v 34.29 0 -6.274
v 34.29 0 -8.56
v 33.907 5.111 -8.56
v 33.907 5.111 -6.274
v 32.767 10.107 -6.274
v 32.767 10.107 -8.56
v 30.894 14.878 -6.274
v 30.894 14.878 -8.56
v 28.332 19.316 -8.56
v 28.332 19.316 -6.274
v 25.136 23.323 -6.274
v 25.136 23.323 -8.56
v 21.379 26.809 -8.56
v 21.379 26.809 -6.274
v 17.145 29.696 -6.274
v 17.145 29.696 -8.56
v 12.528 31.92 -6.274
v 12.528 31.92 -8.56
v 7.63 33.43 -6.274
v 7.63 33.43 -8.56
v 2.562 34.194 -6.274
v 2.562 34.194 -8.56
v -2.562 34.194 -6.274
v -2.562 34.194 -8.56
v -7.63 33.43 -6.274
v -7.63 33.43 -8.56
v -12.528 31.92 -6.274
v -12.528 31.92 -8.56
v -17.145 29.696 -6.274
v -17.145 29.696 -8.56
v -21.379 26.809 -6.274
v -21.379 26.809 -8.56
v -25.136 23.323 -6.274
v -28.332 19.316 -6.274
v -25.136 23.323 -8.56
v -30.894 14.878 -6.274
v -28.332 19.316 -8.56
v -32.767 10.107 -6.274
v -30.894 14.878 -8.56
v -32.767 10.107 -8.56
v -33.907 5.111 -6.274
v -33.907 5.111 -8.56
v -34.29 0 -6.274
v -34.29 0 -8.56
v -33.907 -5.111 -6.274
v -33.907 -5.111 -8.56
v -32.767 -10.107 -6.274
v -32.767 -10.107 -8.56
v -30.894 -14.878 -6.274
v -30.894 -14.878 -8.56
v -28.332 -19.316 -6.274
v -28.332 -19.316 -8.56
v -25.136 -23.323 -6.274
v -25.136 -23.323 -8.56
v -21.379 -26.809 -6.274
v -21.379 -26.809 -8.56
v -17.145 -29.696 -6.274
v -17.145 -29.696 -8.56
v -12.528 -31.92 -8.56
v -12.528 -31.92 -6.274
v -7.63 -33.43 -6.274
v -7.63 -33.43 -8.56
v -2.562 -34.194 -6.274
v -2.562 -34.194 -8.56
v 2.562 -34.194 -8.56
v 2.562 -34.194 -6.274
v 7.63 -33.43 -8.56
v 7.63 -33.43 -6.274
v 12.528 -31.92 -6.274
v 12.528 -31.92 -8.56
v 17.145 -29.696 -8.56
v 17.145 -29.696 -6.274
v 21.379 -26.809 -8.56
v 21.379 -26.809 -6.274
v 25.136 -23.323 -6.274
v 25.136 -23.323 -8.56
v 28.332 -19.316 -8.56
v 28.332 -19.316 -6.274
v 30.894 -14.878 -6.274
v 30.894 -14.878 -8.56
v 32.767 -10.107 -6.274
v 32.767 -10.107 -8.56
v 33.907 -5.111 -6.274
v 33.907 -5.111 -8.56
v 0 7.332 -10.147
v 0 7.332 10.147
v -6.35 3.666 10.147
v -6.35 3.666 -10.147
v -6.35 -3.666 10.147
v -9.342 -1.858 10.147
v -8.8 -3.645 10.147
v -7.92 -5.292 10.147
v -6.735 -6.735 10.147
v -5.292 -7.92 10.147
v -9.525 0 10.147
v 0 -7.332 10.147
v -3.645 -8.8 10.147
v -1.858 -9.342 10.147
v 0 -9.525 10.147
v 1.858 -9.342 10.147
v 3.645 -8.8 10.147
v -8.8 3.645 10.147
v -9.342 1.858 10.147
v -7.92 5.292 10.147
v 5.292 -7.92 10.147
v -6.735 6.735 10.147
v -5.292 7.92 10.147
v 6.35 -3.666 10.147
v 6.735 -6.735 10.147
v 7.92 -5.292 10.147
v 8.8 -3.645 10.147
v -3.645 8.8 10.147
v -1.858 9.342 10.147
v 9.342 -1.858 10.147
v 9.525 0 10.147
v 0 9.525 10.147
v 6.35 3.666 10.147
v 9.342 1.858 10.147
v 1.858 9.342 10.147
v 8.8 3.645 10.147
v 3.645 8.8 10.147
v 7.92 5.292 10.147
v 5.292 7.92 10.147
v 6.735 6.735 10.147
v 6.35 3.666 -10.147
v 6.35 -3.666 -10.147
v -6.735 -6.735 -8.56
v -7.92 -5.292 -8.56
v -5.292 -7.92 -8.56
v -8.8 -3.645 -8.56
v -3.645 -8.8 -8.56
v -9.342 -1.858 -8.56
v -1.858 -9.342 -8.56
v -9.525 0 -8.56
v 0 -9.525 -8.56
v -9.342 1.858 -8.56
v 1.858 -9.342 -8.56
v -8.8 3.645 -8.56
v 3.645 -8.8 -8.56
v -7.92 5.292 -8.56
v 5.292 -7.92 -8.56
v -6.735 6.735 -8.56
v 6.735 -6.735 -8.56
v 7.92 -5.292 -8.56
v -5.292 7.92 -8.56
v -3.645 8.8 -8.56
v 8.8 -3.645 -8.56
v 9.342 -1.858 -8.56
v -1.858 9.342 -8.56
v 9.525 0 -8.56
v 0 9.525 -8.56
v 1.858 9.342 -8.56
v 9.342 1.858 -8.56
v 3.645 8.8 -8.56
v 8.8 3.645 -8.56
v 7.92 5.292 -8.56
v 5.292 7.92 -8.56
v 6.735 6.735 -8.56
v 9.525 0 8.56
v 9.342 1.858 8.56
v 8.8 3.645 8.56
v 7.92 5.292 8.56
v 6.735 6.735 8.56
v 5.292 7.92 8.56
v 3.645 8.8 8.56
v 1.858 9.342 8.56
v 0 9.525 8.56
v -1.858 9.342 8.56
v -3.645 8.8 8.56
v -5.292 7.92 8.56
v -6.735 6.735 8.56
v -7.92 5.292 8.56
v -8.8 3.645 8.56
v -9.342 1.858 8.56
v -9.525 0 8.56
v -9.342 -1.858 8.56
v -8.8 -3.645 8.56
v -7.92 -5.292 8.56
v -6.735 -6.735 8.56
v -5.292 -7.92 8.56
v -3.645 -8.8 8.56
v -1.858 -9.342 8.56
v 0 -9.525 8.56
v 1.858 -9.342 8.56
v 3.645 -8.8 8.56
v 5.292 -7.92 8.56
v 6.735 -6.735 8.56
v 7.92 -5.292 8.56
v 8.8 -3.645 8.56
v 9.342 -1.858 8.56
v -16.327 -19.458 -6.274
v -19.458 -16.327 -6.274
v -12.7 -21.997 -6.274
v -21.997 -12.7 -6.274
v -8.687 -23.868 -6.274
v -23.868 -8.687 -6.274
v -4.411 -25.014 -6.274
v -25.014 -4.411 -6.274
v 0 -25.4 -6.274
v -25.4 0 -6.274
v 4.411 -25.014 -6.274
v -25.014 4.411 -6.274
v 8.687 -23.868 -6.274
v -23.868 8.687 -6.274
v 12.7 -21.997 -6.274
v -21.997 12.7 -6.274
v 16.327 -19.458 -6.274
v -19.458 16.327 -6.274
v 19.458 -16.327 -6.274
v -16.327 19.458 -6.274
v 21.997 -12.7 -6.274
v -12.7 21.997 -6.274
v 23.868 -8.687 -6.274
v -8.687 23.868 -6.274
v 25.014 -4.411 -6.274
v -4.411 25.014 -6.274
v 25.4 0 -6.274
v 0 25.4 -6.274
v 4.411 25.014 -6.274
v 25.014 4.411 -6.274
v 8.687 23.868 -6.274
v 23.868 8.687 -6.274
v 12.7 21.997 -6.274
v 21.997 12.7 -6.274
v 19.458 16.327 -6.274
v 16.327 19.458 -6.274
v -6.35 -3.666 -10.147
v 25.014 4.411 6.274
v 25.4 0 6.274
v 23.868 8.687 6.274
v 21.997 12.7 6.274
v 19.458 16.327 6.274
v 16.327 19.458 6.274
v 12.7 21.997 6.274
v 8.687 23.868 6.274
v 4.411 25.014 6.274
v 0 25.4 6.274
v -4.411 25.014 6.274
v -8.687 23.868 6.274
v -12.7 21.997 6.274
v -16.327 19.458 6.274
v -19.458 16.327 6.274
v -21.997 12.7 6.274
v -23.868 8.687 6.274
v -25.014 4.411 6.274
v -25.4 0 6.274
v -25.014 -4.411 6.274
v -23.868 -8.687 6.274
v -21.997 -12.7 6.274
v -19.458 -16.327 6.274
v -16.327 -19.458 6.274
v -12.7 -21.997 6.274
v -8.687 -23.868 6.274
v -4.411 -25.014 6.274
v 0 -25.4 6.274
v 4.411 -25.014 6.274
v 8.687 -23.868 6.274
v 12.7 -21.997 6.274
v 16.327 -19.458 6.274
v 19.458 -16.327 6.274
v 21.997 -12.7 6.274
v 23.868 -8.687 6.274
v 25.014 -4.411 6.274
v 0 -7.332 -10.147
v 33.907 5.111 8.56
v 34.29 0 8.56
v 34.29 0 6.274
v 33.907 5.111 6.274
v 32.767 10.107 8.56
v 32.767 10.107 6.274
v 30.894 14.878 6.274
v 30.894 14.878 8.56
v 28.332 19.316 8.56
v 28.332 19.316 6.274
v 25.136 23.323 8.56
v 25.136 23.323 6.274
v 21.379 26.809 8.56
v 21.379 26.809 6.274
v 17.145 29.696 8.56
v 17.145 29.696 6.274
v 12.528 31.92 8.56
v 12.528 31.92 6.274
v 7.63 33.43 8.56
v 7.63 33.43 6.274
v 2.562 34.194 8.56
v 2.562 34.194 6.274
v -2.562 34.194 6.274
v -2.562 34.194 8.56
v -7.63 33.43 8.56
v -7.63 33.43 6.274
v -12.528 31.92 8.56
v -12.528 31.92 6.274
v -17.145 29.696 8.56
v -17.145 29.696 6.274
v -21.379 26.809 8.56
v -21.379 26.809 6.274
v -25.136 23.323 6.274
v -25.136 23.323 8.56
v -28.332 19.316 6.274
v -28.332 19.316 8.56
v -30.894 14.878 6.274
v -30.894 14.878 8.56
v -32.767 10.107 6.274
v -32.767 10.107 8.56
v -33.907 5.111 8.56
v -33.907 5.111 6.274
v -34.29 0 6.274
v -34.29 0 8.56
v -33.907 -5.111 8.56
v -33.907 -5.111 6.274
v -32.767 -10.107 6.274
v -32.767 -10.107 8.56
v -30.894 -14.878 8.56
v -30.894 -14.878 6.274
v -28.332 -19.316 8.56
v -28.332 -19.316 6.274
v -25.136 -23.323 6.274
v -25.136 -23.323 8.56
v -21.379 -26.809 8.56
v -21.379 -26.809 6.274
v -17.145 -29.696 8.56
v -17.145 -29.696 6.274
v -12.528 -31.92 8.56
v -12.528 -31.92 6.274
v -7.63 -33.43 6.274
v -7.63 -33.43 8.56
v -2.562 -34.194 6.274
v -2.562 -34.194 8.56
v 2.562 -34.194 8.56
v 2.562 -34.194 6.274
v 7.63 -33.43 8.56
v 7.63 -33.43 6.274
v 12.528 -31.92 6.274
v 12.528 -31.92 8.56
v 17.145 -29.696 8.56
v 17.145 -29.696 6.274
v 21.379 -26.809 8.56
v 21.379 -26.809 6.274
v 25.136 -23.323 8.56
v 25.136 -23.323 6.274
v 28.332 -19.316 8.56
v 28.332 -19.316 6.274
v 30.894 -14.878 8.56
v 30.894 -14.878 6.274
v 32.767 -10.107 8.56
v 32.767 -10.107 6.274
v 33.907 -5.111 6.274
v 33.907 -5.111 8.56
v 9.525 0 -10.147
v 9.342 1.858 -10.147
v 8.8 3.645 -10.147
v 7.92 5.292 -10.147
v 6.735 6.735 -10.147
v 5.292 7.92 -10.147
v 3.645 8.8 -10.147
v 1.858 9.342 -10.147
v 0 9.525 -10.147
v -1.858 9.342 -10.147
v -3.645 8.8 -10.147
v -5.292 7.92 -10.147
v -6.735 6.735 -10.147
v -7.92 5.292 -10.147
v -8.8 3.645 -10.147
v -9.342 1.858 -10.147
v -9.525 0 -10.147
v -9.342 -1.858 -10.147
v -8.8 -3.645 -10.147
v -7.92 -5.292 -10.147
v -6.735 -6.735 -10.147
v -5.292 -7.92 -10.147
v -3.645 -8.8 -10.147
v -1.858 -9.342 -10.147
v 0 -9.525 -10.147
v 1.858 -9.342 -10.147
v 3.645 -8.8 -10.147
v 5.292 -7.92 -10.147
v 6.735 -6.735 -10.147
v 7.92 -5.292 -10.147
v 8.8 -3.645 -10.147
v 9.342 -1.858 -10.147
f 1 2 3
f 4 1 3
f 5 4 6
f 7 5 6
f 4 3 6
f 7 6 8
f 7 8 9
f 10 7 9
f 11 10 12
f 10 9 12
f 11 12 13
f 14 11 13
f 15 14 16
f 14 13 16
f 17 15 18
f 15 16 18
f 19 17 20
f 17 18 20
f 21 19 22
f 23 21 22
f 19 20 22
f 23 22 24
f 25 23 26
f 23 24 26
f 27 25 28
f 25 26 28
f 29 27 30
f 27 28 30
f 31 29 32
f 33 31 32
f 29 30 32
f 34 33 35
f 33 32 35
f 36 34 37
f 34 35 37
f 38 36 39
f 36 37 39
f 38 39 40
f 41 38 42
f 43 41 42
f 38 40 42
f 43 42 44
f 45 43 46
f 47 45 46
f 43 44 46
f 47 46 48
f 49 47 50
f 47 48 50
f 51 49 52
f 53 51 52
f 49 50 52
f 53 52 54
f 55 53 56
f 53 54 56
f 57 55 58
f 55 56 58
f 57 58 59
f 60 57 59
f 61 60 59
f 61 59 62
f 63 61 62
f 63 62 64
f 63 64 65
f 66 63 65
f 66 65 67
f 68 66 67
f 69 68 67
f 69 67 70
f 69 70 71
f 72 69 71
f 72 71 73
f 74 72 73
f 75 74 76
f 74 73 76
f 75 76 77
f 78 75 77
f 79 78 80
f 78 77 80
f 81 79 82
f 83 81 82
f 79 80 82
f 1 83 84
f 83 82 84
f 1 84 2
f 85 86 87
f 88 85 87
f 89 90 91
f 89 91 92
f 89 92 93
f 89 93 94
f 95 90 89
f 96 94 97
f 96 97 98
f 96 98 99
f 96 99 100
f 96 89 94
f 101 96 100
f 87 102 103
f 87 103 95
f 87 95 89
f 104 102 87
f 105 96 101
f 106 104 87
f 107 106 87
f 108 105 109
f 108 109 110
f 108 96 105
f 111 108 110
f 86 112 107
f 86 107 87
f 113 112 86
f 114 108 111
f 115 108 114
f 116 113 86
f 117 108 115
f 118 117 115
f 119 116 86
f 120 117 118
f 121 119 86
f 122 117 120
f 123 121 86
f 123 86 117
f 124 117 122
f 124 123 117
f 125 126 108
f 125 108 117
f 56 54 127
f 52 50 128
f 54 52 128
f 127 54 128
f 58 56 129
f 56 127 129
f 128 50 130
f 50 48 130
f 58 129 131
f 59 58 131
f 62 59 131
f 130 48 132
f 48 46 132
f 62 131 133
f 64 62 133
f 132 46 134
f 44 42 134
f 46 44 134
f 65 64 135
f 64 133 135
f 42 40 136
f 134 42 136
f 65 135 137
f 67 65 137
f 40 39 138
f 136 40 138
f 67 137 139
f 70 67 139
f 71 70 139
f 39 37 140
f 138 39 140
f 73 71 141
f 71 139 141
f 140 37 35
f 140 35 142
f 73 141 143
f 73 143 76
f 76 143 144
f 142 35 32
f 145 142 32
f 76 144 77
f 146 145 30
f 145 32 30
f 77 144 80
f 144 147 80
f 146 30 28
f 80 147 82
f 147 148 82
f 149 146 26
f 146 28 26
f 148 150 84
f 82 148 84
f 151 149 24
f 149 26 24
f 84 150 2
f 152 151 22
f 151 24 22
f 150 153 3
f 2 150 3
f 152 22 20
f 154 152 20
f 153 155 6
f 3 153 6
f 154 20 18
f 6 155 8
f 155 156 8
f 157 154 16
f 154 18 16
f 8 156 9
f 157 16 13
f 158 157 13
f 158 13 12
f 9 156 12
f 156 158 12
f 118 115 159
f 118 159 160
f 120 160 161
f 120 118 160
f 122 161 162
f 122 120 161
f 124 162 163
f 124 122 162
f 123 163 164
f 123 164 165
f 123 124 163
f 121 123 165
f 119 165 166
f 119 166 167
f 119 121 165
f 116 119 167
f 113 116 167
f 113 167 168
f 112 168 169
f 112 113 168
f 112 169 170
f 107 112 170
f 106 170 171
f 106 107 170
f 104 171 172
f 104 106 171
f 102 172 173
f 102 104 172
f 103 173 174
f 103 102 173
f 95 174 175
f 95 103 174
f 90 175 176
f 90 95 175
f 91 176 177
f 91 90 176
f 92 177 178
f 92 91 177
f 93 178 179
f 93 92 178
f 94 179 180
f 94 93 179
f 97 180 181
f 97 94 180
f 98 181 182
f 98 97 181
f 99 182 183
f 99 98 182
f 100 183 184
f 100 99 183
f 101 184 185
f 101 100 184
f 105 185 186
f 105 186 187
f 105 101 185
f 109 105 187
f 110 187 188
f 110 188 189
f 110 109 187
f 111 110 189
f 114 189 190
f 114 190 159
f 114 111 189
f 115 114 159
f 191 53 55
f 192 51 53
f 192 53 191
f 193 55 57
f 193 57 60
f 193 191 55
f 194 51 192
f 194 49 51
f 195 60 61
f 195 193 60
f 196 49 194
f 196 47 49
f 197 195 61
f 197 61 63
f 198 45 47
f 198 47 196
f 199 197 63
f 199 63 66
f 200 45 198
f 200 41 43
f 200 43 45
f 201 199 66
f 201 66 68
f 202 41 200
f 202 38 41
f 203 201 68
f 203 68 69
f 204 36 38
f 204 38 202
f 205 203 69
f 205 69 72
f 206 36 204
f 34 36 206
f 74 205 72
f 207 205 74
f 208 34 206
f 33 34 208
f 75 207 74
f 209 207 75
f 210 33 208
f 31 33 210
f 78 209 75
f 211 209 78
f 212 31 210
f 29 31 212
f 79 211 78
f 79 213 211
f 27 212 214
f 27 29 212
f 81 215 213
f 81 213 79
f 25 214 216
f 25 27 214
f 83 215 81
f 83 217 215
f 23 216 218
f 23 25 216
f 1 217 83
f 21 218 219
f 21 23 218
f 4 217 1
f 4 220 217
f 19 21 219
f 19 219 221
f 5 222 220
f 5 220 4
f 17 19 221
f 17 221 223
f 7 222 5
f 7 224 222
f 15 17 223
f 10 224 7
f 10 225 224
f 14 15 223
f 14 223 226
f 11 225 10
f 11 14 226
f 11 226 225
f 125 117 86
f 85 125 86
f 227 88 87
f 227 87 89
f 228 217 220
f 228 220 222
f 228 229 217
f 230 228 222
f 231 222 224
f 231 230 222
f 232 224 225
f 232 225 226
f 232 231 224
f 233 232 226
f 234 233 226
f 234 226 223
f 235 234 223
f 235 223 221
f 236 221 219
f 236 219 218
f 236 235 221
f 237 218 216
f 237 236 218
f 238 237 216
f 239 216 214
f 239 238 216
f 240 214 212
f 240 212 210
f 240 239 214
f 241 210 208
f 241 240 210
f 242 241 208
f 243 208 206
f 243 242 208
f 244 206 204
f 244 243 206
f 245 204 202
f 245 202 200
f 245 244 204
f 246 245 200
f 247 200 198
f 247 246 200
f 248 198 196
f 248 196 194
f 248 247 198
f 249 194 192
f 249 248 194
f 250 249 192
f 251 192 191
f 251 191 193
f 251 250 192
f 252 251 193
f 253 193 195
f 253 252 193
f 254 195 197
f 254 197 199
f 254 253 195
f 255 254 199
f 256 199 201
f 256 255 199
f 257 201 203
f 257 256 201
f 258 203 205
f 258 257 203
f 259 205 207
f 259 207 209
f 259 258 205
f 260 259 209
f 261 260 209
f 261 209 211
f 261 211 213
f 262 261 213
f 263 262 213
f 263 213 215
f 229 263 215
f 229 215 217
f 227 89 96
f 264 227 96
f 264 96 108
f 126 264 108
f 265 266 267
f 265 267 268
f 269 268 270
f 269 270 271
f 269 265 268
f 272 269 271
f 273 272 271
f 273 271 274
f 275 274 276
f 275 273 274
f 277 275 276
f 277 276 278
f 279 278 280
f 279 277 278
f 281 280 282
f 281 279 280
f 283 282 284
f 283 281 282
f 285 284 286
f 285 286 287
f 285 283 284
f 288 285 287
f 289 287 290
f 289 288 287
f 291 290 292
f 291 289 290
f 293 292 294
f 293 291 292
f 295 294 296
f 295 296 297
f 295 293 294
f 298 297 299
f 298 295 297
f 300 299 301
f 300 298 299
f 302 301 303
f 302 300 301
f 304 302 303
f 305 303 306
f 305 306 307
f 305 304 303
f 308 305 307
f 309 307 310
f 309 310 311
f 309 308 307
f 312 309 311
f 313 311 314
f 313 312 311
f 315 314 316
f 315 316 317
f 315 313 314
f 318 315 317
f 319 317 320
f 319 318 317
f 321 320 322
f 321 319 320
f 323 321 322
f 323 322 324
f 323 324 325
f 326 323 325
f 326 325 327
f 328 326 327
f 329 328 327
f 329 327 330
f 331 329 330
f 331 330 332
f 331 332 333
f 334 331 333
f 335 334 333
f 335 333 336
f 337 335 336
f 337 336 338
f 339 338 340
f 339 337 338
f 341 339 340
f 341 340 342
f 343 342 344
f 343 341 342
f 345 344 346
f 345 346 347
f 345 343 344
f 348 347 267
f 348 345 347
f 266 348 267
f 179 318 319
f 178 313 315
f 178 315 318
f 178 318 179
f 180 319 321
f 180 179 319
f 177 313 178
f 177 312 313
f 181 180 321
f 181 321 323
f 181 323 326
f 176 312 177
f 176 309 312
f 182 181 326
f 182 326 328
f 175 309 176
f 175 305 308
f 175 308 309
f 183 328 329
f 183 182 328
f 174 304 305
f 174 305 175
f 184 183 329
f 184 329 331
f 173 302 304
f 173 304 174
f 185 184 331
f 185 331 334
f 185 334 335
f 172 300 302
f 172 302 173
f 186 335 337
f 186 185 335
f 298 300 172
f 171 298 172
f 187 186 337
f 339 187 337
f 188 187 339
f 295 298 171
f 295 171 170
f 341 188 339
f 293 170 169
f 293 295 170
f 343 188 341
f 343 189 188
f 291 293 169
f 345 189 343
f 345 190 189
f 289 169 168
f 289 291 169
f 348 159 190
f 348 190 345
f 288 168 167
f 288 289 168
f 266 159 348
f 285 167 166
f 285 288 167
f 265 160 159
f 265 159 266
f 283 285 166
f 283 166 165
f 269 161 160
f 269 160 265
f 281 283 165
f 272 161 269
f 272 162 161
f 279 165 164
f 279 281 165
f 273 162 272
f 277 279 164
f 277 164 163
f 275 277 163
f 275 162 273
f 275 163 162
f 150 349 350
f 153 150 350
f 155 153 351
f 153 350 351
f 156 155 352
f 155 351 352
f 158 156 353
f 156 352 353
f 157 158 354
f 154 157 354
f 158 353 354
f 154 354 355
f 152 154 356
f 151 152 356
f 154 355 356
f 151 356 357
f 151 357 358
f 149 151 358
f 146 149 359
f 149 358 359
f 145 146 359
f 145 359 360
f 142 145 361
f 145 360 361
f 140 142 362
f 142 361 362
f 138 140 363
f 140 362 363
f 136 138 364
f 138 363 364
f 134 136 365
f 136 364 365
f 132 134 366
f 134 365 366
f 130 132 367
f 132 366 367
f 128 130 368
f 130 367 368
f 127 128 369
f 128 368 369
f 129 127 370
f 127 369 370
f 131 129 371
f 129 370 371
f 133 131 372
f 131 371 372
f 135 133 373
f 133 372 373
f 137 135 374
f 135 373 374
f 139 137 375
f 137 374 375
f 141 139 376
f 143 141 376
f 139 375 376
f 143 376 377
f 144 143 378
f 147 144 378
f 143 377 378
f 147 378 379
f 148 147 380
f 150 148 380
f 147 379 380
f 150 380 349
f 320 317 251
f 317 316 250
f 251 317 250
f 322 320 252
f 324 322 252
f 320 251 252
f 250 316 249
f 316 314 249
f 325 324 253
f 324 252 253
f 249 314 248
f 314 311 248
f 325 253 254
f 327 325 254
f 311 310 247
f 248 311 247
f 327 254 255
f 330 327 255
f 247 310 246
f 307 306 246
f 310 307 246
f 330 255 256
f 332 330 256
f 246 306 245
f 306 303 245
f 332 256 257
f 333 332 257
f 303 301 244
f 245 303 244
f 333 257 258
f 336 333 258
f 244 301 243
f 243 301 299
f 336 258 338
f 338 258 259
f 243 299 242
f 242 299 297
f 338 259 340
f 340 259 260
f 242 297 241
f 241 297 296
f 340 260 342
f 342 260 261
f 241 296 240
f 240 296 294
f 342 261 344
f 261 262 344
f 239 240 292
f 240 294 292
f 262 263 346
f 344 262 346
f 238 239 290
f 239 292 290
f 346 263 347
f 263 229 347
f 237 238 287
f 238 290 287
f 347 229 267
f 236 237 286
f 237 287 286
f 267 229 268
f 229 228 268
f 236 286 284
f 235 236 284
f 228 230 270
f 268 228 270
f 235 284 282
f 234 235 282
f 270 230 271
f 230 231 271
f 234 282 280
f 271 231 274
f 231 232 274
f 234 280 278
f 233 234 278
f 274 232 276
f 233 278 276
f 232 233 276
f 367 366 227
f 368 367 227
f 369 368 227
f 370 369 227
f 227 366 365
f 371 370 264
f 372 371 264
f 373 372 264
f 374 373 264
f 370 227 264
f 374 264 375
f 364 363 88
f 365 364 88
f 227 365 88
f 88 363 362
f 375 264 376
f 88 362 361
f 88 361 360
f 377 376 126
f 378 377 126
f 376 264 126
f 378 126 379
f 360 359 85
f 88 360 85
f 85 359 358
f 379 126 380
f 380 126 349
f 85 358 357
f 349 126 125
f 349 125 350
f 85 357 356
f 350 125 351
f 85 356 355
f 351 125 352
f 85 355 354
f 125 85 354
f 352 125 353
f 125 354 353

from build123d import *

# Parameters (mm, degrees)
SKETCH2_R           = 25.4
BOSS_EXTRUDE3_DEPTH = 8.21055
SKETCH3_R           = 34.29
BOSS_EXTRUDE4_DEPTH = 1.93675
SKETCH4_R           = 34.29
SKETCH4_R_2         = 9.525
CUT_EXTRUDE1_DEPTH  = 1.5875


with BuildPart() as part:
    # Sketch2 → Boss-Extrude3 (new, symmetric)
    with BuildSketch(Plane.XY):
        Circle(SKETCH2_R)
        Polygon((0, 7.332348419), (-6.35, 3.666174209), (-6.35, -3.666174209), (0, -7.332348419), (6.35, -3.666174209), (6.35, 3.666174209), align=None, mode=Mode.SUBTRACT)
    extrude(amount=BOSS_EXTRUDE3_DEPTH, both=True)

    # Sketch3 → Boss-Extrude4 (add, symmetric)
    with BuildSketch(Plane.XY.offset(8.21055)):
        Circle(SKETCH3_R)
        Polygon((0, 7.332348419), (-6.35, 3.666174209), (-6.35, -3.666174209), (0, -7.332348419), (6.35, -3.666174209), (6.35, 3.666174209), align=None, mode=Mode.SUBTRACT)
    boss_extrude4 = extrude(amount=BOSS_EXTRUDE4_DEPTH, both=True)

    # Sketch4 → Cut-Extrude1 (cut)
    with BuildSketch(Plane.XY.offset(10.1473)):
        Circle(SKETCH4_R)
        Circle(SKETCH4_R_2, mode=Mode.SUBTRACT)
    cut_extrude1 = extrude(amount=-CUT_EXTRUDE1_DEPTH, mode=Mode.SUBTRACT)

    # Mirror1: Boss-Extrude4, Cut-Extrude1 across plane
    add(boss_extrude4.mirror(Plane.XY))
    add(cut_extrude1.mirror(Plane.XY), mode=Mode.SUBTRACT)


solid = part.part
